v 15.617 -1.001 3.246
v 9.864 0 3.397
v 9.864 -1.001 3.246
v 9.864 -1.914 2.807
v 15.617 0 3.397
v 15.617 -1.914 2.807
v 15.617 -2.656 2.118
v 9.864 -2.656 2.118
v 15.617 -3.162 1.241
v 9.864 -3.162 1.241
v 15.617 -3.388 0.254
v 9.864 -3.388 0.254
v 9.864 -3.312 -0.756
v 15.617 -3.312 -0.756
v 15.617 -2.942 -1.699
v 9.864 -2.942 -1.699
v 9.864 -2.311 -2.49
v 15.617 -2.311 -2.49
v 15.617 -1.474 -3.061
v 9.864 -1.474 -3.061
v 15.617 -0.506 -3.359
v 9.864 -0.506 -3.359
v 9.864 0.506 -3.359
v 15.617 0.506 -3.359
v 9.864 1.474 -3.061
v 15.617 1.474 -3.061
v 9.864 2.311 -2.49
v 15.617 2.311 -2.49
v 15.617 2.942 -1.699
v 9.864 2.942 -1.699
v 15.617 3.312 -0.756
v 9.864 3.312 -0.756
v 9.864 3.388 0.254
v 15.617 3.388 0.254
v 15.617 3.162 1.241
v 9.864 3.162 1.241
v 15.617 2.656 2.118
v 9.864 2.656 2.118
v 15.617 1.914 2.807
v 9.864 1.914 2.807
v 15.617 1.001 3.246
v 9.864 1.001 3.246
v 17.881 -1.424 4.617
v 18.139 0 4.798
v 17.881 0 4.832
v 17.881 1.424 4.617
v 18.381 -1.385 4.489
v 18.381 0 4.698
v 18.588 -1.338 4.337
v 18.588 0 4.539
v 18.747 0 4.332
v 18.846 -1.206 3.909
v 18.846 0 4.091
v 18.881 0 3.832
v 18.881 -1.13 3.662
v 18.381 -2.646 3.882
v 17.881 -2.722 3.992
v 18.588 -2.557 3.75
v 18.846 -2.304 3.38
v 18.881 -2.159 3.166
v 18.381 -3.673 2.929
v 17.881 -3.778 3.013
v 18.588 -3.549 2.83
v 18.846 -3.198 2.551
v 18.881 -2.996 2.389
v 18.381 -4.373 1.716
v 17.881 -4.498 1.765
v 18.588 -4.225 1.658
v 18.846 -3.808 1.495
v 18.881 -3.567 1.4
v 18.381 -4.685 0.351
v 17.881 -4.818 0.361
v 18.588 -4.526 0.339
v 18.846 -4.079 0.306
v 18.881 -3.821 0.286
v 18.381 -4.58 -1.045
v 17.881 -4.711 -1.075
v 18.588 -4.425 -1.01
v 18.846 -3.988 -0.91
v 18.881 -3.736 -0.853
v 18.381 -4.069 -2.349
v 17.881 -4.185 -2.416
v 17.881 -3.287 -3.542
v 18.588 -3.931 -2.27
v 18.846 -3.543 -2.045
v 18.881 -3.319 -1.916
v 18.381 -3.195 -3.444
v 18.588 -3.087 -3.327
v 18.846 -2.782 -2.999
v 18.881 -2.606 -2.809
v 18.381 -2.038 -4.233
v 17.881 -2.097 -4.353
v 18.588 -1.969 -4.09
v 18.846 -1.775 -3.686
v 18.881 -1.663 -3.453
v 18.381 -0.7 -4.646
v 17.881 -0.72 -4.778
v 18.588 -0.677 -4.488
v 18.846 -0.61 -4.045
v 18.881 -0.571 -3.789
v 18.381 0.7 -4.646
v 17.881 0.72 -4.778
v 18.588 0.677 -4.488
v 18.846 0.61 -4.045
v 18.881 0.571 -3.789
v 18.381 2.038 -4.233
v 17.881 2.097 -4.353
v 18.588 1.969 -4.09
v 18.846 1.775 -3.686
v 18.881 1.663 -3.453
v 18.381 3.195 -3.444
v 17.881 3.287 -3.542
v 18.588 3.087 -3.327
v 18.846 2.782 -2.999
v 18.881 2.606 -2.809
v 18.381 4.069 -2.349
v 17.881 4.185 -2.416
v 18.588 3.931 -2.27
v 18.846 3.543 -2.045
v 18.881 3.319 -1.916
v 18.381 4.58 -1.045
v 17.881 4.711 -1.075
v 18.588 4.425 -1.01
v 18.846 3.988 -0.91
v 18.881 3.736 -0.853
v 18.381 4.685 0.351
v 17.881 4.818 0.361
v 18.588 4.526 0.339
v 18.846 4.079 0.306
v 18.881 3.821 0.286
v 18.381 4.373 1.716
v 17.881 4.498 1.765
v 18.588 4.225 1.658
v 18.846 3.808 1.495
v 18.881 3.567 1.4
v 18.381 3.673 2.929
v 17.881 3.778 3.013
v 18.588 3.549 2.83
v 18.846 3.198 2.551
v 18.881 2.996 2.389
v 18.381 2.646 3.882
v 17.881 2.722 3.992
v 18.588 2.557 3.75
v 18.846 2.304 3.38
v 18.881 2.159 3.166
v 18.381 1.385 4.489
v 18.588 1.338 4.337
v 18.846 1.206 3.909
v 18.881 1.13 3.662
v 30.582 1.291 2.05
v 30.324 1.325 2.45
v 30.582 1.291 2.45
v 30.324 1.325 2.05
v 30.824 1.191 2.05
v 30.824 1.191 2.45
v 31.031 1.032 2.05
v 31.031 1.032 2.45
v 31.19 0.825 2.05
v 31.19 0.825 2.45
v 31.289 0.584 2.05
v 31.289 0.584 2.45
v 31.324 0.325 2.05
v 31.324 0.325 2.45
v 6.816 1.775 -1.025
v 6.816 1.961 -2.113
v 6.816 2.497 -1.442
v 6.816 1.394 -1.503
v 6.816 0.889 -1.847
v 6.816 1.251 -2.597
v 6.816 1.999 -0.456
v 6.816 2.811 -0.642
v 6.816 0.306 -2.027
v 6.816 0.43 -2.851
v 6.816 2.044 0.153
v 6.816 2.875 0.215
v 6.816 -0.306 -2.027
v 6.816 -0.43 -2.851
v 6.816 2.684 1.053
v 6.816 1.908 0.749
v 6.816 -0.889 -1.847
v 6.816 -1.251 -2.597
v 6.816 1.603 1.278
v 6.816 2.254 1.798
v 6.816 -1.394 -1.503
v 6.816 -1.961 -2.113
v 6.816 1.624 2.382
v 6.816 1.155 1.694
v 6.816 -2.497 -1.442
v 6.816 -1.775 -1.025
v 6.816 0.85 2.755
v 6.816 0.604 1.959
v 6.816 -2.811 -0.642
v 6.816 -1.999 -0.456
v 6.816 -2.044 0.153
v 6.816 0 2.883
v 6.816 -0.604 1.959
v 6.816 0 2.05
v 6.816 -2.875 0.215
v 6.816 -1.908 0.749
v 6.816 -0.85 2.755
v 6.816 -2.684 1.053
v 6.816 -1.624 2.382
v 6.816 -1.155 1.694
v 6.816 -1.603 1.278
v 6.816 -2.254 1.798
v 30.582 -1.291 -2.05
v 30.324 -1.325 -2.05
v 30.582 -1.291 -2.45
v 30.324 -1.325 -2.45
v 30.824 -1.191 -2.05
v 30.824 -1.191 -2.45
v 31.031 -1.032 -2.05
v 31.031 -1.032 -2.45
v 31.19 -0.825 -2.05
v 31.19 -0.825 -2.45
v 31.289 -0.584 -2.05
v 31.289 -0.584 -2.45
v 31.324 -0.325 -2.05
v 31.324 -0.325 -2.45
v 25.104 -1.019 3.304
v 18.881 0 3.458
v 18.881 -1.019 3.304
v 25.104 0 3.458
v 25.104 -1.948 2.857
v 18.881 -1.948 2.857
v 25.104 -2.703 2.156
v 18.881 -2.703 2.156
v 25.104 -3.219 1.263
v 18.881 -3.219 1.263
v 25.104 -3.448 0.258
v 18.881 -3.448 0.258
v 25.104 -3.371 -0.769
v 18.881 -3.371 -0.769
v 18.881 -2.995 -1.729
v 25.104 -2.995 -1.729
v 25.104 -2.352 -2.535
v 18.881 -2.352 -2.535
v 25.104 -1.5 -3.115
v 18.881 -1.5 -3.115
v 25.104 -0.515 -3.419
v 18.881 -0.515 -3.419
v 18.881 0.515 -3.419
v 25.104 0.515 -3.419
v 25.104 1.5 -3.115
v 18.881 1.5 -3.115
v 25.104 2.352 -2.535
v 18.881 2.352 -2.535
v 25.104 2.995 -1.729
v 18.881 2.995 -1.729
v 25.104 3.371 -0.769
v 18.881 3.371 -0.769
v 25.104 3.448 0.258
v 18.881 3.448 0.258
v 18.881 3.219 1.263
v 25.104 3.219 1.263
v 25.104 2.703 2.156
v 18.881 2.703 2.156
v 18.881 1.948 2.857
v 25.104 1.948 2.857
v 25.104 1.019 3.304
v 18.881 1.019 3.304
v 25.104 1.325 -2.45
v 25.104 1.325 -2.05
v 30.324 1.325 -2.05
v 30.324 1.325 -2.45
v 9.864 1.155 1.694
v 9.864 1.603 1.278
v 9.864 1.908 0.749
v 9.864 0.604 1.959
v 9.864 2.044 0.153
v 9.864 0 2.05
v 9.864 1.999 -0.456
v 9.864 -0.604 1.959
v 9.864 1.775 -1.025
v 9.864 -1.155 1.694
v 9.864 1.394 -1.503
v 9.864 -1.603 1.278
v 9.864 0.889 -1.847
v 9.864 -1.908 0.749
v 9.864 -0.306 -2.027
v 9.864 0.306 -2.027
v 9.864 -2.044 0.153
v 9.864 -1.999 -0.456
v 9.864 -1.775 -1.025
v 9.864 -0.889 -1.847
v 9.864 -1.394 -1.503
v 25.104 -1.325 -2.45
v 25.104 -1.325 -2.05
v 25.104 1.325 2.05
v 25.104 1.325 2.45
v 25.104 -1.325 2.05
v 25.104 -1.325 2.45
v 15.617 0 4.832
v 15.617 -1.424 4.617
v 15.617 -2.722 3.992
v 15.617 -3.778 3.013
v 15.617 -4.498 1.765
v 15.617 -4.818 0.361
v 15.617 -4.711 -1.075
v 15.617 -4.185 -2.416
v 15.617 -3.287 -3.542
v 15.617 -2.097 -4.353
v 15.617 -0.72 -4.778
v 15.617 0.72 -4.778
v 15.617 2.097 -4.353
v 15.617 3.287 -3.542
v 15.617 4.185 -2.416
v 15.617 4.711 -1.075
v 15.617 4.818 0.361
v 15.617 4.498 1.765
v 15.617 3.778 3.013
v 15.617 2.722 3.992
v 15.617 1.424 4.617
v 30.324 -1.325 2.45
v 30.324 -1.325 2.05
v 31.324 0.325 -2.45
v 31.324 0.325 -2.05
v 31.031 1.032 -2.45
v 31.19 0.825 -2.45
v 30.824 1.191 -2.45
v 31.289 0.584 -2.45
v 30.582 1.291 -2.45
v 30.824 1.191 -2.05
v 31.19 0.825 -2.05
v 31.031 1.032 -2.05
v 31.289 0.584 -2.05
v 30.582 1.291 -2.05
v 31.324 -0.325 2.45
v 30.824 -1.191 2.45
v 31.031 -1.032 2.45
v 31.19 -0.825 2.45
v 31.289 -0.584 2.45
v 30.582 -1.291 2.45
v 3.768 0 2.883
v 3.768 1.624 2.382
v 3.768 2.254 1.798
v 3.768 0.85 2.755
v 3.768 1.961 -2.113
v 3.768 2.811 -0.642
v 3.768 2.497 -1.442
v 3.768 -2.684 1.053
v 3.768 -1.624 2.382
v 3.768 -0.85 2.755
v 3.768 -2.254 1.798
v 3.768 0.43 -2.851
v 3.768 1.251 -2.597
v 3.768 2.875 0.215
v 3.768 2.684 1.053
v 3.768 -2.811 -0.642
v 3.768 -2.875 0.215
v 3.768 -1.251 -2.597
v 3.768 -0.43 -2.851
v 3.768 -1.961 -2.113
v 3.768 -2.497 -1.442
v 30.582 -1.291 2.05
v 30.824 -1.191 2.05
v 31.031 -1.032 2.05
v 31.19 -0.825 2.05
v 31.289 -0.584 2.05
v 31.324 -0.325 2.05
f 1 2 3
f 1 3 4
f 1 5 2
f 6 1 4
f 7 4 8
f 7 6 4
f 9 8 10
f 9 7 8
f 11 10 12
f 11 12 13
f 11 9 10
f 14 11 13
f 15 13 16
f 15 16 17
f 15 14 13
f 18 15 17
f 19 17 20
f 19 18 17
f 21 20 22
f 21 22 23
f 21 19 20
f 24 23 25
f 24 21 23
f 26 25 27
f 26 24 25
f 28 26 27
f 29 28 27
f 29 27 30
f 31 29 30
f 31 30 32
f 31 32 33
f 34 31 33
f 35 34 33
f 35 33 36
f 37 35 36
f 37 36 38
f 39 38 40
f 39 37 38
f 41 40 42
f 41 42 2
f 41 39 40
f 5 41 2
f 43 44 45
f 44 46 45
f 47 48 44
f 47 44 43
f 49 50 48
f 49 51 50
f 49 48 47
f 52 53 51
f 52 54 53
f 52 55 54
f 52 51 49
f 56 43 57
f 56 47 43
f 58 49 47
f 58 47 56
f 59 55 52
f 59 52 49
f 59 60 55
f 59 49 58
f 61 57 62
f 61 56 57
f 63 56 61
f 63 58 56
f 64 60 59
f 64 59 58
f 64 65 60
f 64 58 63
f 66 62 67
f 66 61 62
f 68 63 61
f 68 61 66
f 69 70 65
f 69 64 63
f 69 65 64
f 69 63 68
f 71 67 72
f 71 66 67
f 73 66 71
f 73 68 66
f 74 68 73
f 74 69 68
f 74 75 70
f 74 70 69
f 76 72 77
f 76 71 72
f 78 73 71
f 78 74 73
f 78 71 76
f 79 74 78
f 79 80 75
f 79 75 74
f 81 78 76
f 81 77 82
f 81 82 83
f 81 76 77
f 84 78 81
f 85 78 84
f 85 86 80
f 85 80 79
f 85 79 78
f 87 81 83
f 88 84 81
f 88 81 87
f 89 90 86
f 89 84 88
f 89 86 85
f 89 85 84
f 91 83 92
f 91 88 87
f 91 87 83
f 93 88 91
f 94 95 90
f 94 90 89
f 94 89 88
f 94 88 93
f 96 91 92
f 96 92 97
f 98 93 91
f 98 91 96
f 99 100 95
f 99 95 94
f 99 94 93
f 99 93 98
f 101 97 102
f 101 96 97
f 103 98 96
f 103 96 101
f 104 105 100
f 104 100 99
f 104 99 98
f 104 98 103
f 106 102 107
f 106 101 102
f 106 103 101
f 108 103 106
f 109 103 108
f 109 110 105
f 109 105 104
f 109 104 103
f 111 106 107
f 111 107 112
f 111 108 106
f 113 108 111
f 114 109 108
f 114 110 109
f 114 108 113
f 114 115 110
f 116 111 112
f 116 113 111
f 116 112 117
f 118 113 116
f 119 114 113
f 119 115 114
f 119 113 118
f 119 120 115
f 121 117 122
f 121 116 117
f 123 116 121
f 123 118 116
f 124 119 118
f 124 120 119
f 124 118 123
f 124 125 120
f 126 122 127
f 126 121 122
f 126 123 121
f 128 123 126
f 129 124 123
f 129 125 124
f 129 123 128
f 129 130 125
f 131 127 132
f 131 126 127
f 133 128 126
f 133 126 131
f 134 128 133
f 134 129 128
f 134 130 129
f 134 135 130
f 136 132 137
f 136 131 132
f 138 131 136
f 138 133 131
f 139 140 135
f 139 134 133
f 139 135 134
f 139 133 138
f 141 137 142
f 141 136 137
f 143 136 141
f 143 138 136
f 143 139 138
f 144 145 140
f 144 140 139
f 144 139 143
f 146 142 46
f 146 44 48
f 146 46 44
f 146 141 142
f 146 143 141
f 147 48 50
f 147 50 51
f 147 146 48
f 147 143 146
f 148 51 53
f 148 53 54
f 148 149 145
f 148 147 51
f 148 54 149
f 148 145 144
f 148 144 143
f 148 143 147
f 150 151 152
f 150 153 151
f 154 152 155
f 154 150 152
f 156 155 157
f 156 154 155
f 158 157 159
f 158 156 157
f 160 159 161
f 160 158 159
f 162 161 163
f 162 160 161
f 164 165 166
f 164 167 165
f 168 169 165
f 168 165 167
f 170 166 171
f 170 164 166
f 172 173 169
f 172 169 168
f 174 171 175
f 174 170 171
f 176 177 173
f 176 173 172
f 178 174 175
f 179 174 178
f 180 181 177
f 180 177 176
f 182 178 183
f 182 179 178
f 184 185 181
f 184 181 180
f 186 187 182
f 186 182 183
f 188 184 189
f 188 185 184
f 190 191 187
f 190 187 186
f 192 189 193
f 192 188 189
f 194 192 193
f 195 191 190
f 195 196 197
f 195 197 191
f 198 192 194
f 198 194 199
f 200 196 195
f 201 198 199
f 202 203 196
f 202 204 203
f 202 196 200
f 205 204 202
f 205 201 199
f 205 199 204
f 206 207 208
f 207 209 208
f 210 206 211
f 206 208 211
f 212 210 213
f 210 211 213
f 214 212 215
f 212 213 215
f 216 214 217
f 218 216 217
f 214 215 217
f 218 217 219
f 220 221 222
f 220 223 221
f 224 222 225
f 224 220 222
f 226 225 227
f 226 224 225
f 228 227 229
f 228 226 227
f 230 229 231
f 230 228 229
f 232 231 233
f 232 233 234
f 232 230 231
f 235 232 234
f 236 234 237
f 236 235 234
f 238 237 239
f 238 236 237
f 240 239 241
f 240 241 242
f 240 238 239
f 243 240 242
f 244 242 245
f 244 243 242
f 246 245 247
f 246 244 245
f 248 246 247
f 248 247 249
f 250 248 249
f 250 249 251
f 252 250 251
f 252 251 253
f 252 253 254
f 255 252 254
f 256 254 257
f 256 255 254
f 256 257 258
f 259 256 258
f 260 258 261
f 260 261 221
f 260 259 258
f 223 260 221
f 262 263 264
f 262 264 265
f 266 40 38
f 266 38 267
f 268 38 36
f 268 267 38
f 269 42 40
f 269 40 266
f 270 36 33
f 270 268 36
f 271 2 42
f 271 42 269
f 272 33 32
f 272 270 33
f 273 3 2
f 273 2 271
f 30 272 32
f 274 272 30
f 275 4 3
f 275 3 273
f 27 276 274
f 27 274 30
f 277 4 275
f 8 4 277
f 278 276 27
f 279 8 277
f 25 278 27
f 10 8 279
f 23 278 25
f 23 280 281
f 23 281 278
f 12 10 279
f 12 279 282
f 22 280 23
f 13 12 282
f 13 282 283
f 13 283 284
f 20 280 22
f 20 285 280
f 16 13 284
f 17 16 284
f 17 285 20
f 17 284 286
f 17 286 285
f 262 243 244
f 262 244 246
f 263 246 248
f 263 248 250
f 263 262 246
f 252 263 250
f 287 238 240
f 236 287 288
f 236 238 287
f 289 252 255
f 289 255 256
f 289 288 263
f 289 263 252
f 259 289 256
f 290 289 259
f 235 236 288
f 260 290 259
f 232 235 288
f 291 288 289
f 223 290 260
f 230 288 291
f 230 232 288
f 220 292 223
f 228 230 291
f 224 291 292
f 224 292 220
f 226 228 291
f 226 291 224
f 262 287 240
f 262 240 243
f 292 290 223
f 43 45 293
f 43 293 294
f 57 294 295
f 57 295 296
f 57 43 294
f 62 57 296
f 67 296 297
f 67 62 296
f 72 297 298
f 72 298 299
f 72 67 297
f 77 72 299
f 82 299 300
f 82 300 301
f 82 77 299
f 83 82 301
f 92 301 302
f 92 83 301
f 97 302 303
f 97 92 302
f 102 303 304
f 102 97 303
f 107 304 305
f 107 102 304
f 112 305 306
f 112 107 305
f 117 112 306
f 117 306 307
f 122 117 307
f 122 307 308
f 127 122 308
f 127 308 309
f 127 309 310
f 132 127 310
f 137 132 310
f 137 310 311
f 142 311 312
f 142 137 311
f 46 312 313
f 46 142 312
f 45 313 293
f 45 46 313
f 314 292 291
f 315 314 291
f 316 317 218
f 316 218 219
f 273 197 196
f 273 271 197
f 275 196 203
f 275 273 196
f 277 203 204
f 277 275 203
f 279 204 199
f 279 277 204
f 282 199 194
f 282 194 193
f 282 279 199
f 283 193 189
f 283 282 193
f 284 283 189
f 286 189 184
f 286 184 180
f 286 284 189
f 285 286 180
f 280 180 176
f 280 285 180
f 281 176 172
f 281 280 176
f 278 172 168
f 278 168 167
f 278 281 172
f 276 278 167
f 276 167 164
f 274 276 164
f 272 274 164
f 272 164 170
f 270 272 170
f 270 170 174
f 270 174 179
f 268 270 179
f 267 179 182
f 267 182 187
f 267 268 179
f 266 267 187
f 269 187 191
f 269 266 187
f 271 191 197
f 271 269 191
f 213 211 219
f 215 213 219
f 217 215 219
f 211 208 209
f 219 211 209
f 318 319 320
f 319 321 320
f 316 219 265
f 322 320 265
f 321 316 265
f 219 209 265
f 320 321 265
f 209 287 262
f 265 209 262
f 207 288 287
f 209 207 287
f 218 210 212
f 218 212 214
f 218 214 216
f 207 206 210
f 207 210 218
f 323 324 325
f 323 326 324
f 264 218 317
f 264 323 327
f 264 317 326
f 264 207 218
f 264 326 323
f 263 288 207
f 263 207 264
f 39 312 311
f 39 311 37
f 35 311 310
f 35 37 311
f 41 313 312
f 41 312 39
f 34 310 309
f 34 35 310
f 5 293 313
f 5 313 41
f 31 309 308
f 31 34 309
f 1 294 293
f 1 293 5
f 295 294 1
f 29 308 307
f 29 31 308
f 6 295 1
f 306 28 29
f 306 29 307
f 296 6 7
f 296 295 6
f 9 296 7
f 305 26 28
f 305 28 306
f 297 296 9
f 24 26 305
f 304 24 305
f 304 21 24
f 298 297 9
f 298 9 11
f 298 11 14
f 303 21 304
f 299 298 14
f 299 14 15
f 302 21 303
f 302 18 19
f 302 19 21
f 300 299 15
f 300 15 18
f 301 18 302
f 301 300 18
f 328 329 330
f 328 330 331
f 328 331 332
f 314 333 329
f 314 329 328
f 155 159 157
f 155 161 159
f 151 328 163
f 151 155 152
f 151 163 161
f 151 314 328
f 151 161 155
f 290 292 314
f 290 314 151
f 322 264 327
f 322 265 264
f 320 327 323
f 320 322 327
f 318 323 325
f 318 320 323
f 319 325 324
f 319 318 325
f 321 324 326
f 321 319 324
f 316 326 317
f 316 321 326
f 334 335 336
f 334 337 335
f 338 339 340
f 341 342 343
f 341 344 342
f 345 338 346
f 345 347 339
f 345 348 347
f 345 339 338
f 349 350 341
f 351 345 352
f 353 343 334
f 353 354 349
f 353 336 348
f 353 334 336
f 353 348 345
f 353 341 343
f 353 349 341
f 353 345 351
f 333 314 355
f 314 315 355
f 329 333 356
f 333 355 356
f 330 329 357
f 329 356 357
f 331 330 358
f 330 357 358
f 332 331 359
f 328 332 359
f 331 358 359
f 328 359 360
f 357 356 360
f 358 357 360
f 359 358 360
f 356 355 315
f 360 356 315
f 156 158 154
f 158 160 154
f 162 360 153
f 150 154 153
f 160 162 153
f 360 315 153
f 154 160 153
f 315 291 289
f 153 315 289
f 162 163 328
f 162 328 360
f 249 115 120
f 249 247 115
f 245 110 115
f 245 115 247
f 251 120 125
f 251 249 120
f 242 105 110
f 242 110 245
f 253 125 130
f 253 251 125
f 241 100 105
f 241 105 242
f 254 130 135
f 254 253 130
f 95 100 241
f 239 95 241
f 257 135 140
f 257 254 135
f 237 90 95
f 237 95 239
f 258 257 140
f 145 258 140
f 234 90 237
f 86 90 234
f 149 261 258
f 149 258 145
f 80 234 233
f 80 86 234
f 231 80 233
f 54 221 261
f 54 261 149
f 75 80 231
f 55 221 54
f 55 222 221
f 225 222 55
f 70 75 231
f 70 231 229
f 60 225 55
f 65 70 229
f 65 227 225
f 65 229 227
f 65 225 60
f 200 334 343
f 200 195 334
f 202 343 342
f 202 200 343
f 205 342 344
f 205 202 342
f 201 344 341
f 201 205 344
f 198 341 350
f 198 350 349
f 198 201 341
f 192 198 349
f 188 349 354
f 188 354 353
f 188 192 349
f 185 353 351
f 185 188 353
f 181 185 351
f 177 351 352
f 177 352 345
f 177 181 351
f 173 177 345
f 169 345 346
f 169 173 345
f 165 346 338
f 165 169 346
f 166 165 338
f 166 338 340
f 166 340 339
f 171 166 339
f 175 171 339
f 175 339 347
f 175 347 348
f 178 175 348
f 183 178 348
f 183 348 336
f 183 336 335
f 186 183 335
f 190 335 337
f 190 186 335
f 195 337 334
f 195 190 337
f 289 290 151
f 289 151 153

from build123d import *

# Parameters (mm, degrees)
FILLET1_R           = 1
SKETCH2_W           = 0.4
SKETCH2_H           = 2.65
BOSS_EXTRUDE1_DEPTH = 6.22
FILLET2_R           = 1


with BuildPart() as part:
    # Sketch1 → Revolve1 (revolve)
    with BuildSketch(Plane.XY, mode=Mode.PRIVATE) as revolve1_sk:
        Polygon((25.103538705, 0), (3.767538705, 0), (3.767538705, 2.883), (6.815538705, 2.883), (6.815538705, 2.049985706), (9.863538705, 2.049985706), (9.863538705, 3.397), (15.616538705, 3.397), (15.616538705, 4.832), (18.880538705, 4.832), (18.880538705, 3.457874146), (25.103538705, 3.457874146), align=None)
    revolve(revolve1_sk.sketch.rotate(Axis((0, 0, 0), (1, 0, 0)), 90), axis=Axis((0, 0, 0), (1, 0, 0)))

    # Fillet1
    fillet1_edges = [part.edges().sort_by_distance(p)[0] for p in [
        (18.880538705, 0, -4.832),
    ]]
    fillet(fillet1_edges, radius=FILLET1_R)

    # Sketch2 → Boss-Extrude1 (add)
    with BuildSketch(Plane(origin=(25.103538705, 0, 0), x_dir=(0, 0, -1), z_dir=(1, 0, 0))):
        with Locations((-2.25, 0)):
            Rectangle(SKETCH2_W, SKETCH2_H)
        with Locations((2.25, 0)):
            Rectangle(SKETCH2_W, SKETCH2_H)
    extrude(amount=BOSS_EXTRUDE1_DEPTH)

    # Fillet2
    fillet2_edges = [part.edges().sort_by_distance(p)[0] for p in [
        (31.323538705, 1.325, 2.25),
        (31.323538705, -1.325, 2.25),
        (31.323538705, 1.325, -2.25),
        (31.323538705, -1.325, -2.25),
    ]]
    fillet(fillet2_edges, radius=FILLET2_R)


solid = part.part
